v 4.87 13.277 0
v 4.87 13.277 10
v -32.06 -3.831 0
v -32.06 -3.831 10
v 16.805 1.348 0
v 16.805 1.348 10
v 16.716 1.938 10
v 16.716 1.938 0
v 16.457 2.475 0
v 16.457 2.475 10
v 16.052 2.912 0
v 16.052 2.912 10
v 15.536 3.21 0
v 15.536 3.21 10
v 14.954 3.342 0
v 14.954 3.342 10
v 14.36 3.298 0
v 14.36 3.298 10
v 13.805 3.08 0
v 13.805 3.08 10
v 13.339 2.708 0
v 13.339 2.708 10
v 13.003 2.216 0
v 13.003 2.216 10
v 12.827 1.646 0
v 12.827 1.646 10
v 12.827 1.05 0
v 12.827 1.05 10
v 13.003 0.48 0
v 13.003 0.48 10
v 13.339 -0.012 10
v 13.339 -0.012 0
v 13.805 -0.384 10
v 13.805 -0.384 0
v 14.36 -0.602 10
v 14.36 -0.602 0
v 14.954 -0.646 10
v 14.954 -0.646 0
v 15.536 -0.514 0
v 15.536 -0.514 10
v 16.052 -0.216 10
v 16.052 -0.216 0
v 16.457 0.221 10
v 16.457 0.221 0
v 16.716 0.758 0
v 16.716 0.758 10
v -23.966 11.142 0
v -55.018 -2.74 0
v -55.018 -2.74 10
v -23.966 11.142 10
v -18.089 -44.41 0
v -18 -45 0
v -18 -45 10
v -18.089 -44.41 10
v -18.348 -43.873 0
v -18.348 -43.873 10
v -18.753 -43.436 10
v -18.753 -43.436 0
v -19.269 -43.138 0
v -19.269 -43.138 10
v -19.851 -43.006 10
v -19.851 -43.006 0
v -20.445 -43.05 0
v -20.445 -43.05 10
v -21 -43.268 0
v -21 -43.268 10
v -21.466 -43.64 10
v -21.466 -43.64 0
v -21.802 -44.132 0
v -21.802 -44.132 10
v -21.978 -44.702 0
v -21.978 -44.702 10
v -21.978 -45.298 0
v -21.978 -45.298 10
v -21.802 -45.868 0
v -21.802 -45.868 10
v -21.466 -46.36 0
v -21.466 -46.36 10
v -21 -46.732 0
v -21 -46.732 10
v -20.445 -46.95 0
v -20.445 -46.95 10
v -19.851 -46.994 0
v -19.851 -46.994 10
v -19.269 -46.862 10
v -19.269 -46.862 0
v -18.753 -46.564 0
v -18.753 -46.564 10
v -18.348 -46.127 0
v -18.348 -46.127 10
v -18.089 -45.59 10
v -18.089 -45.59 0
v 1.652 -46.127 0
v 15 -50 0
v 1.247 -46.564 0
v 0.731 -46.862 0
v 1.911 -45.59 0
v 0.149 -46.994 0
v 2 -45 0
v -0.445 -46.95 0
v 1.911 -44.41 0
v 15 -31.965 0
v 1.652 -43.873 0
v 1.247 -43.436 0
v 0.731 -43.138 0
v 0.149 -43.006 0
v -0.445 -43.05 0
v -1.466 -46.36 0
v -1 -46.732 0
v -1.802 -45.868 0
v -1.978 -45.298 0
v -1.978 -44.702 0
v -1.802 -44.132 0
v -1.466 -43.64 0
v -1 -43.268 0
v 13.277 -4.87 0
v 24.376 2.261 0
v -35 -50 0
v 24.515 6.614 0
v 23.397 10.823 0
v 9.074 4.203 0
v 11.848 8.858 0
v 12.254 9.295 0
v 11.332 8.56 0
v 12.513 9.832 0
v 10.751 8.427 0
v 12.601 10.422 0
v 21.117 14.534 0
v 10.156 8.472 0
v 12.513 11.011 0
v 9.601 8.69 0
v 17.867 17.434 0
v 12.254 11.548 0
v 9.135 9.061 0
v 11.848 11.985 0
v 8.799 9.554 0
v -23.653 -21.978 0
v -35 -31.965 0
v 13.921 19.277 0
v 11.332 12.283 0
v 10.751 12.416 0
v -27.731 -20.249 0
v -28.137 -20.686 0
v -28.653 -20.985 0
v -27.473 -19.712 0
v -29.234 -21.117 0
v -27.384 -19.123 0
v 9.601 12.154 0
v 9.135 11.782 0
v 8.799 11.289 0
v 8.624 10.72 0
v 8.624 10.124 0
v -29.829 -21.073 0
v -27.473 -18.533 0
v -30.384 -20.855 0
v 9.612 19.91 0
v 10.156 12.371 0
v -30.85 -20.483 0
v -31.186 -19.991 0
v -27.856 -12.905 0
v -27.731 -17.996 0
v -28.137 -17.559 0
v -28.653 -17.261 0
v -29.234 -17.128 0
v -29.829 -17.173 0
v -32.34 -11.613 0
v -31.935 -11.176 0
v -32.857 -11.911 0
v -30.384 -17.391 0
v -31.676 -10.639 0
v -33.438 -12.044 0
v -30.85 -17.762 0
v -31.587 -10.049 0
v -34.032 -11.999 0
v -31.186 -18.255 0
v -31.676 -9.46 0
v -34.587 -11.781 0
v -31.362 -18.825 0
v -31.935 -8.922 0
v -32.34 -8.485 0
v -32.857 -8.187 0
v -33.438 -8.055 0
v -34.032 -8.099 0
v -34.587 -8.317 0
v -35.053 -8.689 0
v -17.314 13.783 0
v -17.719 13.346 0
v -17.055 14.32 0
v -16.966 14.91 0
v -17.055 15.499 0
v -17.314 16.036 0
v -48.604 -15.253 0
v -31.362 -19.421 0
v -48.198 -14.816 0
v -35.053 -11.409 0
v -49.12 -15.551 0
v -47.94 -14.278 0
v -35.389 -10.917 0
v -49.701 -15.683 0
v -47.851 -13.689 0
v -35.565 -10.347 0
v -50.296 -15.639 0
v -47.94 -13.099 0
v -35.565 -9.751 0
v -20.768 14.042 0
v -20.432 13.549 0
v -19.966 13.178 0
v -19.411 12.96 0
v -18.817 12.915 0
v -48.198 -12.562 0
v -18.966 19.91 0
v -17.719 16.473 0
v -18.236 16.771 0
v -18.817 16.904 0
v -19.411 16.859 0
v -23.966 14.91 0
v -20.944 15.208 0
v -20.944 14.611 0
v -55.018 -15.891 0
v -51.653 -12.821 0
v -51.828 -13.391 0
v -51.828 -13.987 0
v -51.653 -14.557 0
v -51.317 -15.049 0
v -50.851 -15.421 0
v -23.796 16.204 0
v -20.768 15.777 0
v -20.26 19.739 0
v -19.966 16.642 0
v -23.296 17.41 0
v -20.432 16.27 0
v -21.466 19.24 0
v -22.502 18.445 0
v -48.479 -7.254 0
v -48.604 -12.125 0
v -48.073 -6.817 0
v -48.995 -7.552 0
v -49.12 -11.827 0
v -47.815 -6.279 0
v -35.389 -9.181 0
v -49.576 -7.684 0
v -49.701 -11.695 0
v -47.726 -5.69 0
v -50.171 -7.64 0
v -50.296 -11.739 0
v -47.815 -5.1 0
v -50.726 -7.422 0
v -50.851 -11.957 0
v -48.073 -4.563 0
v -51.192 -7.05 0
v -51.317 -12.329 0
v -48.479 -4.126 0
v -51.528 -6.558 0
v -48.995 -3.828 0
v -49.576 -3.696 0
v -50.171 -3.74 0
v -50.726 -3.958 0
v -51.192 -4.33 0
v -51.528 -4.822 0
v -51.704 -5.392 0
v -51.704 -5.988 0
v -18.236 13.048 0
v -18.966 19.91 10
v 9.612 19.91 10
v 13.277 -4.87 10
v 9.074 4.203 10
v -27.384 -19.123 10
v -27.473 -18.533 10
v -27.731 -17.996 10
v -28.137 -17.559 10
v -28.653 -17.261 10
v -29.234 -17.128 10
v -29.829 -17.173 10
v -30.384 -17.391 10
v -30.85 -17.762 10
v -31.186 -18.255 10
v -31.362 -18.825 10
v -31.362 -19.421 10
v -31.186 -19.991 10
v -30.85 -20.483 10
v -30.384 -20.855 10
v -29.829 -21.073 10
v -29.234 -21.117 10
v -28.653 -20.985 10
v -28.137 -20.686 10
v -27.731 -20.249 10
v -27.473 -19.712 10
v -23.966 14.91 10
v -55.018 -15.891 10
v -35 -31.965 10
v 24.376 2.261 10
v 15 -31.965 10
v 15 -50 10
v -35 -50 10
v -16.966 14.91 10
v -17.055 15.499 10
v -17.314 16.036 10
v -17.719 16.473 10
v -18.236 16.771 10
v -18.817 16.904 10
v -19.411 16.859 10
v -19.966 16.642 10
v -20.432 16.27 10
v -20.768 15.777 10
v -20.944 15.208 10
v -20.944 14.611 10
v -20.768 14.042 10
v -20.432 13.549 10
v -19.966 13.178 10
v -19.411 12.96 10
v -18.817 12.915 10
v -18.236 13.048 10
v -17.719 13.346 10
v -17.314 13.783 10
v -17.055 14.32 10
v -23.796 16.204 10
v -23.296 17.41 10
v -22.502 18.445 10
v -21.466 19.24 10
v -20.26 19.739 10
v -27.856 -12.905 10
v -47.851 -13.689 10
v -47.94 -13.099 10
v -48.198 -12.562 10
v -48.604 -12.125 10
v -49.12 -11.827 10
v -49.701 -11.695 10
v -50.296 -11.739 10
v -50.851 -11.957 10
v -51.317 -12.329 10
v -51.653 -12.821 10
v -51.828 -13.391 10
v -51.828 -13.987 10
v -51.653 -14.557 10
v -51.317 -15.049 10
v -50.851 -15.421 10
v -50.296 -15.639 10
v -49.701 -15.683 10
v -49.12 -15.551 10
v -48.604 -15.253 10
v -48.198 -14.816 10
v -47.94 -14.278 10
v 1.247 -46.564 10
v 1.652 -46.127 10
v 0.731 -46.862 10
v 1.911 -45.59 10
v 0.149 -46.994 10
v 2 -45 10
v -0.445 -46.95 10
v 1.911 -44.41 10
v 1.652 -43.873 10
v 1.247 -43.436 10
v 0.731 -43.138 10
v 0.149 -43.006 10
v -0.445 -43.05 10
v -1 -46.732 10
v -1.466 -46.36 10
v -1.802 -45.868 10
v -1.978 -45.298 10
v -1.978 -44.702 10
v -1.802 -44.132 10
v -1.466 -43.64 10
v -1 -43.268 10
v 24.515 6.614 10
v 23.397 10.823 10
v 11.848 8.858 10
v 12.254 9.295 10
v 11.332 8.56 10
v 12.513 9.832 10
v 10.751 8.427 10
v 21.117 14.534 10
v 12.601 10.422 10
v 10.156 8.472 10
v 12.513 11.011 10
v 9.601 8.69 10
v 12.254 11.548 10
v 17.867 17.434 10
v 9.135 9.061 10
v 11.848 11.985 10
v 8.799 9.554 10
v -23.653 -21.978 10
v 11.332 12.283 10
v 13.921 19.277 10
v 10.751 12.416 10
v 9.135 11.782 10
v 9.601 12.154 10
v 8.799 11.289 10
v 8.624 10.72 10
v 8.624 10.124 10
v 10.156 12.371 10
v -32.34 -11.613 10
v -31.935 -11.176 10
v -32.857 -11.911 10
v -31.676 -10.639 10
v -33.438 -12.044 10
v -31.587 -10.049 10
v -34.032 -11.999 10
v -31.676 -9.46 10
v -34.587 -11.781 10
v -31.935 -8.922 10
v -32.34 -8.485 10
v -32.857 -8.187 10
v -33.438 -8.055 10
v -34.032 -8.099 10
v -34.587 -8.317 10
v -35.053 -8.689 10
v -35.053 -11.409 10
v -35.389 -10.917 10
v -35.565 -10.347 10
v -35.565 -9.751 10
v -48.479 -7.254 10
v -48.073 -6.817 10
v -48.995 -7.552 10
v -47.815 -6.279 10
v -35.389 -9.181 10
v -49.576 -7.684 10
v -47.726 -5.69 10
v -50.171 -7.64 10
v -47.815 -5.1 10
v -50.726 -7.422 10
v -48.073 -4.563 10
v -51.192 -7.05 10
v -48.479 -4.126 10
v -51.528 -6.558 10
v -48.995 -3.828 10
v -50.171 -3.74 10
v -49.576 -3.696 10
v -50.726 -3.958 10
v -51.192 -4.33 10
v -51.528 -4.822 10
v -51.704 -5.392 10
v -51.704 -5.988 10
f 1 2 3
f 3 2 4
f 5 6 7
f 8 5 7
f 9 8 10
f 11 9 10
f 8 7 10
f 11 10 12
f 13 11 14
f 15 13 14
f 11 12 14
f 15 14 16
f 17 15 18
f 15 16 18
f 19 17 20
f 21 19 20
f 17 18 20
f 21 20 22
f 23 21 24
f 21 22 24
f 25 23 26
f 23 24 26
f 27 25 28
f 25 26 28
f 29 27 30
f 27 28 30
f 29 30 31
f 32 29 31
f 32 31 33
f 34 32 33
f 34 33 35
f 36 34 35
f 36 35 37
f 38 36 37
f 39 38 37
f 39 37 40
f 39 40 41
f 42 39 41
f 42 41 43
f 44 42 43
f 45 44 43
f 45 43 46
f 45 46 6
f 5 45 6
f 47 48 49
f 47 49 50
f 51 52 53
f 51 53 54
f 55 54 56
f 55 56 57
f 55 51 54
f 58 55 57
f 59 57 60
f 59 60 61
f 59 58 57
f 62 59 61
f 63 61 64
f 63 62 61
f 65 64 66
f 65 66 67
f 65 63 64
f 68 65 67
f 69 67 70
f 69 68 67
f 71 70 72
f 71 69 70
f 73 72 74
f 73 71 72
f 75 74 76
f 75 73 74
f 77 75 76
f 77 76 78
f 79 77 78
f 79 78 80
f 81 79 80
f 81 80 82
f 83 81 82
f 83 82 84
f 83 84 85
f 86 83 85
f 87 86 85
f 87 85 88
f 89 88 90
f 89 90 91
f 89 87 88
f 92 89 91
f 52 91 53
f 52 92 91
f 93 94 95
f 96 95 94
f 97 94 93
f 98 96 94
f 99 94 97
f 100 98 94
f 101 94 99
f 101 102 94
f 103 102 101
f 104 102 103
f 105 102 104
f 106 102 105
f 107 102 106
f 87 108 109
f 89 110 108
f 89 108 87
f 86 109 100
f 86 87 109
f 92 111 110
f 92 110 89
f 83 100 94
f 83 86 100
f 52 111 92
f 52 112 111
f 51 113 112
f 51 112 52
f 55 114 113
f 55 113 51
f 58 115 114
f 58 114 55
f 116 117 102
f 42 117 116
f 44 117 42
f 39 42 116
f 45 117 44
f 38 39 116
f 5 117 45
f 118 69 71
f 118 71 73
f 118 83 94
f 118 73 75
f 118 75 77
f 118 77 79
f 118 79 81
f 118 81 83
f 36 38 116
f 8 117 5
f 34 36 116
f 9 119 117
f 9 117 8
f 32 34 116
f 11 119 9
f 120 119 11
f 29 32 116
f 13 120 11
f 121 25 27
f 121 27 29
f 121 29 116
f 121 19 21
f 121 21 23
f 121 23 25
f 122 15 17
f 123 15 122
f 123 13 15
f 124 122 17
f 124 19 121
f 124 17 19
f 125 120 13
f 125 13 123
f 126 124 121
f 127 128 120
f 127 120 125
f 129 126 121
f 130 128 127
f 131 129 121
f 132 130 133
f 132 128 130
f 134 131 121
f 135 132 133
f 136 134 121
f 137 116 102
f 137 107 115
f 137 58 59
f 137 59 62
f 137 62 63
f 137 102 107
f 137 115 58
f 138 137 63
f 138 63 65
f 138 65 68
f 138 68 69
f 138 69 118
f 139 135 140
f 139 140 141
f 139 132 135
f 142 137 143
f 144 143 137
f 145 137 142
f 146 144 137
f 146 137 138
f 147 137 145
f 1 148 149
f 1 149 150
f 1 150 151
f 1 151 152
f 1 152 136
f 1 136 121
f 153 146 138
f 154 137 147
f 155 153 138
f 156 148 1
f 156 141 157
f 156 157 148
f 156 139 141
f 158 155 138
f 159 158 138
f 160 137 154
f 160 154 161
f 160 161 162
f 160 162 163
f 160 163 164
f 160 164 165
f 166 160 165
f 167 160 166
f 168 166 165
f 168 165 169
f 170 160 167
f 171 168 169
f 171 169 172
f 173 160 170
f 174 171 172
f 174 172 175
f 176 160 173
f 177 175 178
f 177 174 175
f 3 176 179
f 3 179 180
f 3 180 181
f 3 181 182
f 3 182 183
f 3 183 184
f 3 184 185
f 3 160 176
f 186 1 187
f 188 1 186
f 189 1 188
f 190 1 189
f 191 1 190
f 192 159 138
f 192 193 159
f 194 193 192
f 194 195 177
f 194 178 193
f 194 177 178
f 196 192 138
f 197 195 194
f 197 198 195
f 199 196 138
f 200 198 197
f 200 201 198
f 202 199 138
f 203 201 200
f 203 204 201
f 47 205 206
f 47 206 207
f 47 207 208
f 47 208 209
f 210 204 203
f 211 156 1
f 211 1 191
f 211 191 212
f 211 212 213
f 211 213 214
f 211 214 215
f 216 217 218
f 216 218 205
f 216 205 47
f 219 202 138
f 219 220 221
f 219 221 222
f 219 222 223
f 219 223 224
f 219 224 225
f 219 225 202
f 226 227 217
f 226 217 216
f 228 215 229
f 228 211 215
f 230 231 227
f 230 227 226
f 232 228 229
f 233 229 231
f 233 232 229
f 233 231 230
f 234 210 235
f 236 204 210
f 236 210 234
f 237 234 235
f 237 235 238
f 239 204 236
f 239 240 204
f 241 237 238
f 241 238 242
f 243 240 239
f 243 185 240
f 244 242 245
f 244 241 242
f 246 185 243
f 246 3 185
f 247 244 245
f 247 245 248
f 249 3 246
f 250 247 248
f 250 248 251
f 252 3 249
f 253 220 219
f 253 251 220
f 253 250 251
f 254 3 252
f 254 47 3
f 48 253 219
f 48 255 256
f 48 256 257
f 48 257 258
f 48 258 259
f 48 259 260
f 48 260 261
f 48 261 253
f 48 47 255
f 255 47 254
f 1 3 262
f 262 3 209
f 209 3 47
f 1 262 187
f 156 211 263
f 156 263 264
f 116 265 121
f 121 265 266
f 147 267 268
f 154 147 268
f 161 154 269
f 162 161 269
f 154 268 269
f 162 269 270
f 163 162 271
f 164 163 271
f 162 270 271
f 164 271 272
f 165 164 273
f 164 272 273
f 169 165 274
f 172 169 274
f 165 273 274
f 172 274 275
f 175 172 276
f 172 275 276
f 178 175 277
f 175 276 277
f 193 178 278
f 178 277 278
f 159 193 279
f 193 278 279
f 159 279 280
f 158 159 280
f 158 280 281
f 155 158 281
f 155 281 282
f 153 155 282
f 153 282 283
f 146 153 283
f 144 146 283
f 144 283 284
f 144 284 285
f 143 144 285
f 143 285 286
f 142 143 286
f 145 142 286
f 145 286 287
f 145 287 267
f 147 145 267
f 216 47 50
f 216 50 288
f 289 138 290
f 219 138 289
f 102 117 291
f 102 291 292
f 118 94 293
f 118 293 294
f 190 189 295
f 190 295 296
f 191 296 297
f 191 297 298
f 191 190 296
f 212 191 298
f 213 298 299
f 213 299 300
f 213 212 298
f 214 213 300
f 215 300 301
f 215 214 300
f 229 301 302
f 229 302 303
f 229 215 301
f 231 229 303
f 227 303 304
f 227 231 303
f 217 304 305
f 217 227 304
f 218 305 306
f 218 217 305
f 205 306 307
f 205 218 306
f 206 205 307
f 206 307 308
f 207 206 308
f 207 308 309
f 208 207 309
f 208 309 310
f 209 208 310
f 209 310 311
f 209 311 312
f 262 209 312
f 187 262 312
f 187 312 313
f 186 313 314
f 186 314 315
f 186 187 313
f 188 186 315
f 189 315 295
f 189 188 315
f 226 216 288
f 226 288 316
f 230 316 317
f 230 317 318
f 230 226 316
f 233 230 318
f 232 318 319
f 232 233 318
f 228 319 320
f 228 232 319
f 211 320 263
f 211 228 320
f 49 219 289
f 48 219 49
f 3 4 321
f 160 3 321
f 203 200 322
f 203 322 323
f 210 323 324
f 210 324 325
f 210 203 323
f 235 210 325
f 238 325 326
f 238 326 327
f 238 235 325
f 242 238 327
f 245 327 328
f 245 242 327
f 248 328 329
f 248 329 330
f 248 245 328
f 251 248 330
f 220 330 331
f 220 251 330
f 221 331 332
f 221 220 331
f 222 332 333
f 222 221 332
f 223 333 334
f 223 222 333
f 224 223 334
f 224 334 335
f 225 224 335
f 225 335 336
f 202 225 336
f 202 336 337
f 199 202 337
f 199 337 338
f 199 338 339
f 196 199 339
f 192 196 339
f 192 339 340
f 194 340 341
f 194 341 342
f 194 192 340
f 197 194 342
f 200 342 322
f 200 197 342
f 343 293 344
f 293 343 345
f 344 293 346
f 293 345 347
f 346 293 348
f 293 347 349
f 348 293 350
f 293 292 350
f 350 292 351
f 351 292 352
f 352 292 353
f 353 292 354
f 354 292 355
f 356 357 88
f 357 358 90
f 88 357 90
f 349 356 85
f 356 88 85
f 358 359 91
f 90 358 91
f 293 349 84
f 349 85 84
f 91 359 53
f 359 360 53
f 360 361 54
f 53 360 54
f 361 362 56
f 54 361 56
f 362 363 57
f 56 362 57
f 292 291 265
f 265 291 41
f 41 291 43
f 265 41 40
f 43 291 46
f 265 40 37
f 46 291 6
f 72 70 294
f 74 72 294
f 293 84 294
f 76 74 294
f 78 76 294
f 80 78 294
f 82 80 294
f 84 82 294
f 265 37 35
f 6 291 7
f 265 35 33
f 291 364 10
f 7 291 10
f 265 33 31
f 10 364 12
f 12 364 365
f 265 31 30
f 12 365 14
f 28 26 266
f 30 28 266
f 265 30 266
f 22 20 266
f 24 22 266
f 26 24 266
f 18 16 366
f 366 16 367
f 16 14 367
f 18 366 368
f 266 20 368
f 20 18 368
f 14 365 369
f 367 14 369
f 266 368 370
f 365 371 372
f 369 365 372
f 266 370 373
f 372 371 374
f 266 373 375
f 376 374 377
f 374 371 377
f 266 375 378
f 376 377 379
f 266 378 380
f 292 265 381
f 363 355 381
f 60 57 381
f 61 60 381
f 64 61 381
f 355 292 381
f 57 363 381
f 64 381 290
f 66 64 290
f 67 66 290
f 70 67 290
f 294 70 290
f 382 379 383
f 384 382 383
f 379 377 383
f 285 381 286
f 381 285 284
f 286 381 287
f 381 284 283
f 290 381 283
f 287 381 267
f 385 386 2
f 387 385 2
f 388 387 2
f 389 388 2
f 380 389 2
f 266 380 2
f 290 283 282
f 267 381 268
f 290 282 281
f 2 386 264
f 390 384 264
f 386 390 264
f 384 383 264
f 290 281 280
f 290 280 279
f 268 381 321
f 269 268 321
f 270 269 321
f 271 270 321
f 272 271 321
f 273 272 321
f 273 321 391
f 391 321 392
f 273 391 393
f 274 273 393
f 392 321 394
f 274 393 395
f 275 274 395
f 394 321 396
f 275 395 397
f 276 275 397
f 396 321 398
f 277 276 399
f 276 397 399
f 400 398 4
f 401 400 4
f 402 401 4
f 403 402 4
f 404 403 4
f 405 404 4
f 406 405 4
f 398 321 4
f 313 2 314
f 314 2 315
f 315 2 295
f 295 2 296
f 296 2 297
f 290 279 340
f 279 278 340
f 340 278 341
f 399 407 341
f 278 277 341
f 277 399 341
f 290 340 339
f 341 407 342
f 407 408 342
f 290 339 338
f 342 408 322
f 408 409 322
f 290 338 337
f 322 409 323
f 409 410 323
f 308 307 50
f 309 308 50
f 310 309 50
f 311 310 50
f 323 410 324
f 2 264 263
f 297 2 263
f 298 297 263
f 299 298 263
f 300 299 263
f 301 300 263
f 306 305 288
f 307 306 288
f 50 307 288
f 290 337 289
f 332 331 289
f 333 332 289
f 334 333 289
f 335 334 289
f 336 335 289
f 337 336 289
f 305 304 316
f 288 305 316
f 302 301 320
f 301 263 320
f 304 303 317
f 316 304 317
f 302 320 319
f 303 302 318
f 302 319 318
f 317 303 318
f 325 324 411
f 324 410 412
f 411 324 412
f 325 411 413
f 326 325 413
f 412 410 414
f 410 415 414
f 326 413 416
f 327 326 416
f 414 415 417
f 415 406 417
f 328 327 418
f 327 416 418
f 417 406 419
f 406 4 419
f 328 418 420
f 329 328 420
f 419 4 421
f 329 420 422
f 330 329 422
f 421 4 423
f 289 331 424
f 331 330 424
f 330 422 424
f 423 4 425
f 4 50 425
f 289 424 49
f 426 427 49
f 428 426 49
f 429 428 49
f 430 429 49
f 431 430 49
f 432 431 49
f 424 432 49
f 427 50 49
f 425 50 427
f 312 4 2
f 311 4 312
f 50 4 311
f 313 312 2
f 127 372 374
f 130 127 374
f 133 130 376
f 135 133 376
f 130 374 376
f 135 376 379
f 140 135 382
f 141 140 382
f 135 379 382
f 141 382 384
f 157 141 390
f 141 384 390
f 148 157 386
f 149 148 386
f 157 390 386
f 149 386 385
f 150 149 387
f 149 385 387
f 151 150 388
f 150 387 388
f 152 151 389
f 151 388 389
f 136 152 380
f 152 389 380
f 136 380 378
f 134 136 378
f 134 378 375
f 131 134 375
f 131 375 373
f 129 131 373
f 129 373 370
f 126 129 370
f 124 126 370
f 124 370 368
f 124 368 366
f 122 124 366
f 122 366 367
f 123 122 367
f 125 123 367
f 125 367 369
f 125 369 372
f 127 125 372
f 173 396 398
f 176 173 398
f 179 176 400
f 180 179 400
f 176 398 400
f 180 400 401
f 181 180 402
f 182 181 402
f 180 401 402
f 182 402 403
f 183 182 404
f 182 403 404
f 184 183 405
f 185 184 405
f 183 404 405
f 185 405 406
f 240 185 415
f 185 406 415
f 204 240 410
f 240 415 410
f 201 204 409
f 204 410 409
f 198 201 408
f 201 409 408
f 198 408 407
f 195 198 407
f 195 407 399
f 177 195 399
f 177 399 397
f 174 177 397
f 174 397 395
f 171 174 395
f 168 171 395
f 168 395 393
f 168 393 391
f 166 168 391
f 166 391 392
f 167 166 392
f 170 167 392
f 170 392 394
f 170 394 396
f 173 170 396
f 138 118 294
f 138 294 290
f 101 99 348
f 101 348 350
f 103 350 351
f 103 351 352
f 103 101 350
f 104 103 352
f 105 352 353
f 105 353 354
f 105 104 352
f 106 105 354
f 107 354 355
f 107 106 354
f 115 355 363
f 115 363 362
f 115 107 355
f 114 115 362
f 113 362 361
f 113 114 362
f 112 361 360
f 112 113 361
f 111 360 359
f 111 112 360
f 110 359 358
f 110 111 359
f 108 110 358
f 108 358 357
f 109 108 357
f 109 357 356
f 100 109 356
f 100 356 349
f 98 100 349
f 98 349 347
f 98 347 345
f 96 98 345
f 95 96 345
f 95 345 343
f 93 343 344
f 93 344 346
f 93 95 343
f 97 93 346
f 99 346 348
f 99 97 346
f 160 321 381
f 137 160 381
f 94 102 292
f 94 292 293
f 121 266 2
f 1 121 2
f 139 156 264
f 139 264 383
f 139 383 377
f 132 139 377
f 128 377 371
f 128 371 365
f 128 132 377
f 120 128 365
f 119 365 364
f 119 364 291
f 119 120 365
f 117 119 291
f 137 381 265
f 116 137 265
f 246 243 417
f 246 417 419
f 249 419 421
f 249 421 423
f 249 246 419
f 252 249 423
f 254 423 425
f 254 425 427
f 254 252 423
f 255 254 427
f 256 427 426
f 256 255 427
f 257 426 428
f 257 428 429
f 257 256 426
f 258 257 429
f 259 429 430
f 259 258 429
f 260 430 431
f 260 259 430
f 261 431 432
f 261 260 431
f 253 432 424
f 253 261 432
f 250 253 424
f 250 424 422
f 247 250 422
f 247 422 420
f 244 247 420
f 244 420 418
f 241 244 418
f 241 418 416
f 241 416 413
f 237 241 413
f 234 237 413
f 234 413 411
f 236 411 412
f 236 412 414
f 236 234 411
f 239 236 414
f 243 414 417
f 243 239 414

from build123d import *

# Parameters (mm, degrees)
SCHIZZO1_R                   = 2.5
SCHIZZO1_R_2                 = 2
ESTRUSIONE_ESTRUSIONE1_DEPTH = 10
TAGLIO_ESTRUSIONE1_DEPTH     = 76.013178039
SCHIZZO3_R                   = 2
TAGLIO_ESTRUSIONE2_DEPTH     = 76.013178039


with BuildPart() as part:
    # Schizzo1 → Estrusione-Estrusione1 (new body)
    with BuildSketch(Plane.XY):
        with BuildLine():
            Line((15, -50), (-35, -50))
            Line((-35, -50), (-35, -31.964890017))
            Line((-35, -31.964890017), (-55.017968697, -15.891116751))
            Line((-55.017968697, -15.891116751), (-55.017968697, -2.739847716))
            Line((-55.017968697, -2.739847716), (-23.966361252, 11.142047377))
            Line((-23.966361252, 11.142047377), (-23.966361252, 14.909560068))
            ThreePointArc((-23.966361252, 14.909560068), (-22.501895158, 18.445093974), (-18.966361252, 19.909560068))
            Line((-18.966361252, 19.909560068), (9.612052016, 19.909560068))
            ThreePointArc((9.612052016, 19.909560068), (21.117133083, 14.534169651), (24.376307149, 2.260641352))
            Line((24.376307149, 2.260641352), (15, -31.964890017))
            Line((15, -31.964890017), (15, -50))
        make_face()
        Circle(SCHIZZO1_R, mode=Mode.SUBTRACT)
        with Locations((-20, -45)):
            Circle(SCHIZZO1_R_2, mode=Mode.SUBTRACT)
        with Locations((0, -45)):
            Circle(SCHIZZO1_R_2, mode=Mode.SUBTRACT)
        with Locations((-49.725907234, -5.689936133)):
            Circle(SCHIZZO1_R_2, mode=Mode.SUBTRACT)
        with Locations((-49.850768961, -13.68896167)):
            Circle(SCHIZZO1_R_2, mode=Mode.SUBTRACT)
        with Locations((-18.966361252, 14.909560068)):
            Circle(SCHIZZO1_R_2, mode=Mode.SUBTRACT)
    extrude(amount=ESTRUSIONE_ESTRUSIONE1_DEPTH)

    # Schizzo2 → Taglio-Estrusione1 (cut, through all)
    with BuildSketch(Plane.XY.offset(10)):
        with BuildLine():
            Line((-27.856099407, -12.90456221), (-2.268412004, -1.050860115))
            ThreePointArc((-2.268412004, -1.050860115), (-1.050860115, 2.268412004), (2.268412004, 1.050860115))
            Line((2.268412004, 1.050860115), (9.073648015, 4.203440459))
            Line((9.073648015, 4.203440459), (4.870207556, 13.277088475))
            Line((4.870207556, 13.277088475), (-32.059539866, -3.830914194))
            Line((-32.059539866, -3.830914194), (-27.856099407, -12.90456221))
        make_face()
        with BuildLine():
            ThreePointArc((2.5, 0), (0.538038098, -2.441416598), (-2.268412004, -1.050860115))
            Line((-2.268412004, -1.050860115), (-27.856099407, -12.90456221))
            Line((-27.856099407, -12.90456221), (-23.652658948, -21.978210225))
            Line((-23.652658948, -21.978210225), (13.277088475, -4.870207556))
            Line((13.277088475, -4.870207556), (9.073648015, 4.203440459))
            Line((9.073648015, 4.203440459), (2.268412004, 1.050860115))
            ThreePointArc((2.268412004, 1.050860115), (2.441416598, 0.538038098), (2.5, 0))
        make_face()
    extrude(amount=-TAGLIO_ESTRUSIONE1_DEPTH, mode=Mode.SUBTRACT)

    # Schizzo3 → Taglio-Estrusione2 (cut, through all)
    with BuildSketch(Plane.XY.offset(10)):
        with Locations((10.601386992, 10.421640651)):
            Circle(SCHIZZO3_R)
        with Locations((14.804827451, 1.347992635)):
            Circle(SCHIZZO3_R)
        with Locations((-29.383838384, -19.122762401)):
            Circle(SCHIZZO3_R)
        with Locations((-33.587278843, -10.049114386)):
            Circle(SCHIZZO3_R)
    extrude(amount=-TAGLIO_ESTRUSIONE2_DEPTH, mode=Mode.SUBTRACT)


solid = part.part
